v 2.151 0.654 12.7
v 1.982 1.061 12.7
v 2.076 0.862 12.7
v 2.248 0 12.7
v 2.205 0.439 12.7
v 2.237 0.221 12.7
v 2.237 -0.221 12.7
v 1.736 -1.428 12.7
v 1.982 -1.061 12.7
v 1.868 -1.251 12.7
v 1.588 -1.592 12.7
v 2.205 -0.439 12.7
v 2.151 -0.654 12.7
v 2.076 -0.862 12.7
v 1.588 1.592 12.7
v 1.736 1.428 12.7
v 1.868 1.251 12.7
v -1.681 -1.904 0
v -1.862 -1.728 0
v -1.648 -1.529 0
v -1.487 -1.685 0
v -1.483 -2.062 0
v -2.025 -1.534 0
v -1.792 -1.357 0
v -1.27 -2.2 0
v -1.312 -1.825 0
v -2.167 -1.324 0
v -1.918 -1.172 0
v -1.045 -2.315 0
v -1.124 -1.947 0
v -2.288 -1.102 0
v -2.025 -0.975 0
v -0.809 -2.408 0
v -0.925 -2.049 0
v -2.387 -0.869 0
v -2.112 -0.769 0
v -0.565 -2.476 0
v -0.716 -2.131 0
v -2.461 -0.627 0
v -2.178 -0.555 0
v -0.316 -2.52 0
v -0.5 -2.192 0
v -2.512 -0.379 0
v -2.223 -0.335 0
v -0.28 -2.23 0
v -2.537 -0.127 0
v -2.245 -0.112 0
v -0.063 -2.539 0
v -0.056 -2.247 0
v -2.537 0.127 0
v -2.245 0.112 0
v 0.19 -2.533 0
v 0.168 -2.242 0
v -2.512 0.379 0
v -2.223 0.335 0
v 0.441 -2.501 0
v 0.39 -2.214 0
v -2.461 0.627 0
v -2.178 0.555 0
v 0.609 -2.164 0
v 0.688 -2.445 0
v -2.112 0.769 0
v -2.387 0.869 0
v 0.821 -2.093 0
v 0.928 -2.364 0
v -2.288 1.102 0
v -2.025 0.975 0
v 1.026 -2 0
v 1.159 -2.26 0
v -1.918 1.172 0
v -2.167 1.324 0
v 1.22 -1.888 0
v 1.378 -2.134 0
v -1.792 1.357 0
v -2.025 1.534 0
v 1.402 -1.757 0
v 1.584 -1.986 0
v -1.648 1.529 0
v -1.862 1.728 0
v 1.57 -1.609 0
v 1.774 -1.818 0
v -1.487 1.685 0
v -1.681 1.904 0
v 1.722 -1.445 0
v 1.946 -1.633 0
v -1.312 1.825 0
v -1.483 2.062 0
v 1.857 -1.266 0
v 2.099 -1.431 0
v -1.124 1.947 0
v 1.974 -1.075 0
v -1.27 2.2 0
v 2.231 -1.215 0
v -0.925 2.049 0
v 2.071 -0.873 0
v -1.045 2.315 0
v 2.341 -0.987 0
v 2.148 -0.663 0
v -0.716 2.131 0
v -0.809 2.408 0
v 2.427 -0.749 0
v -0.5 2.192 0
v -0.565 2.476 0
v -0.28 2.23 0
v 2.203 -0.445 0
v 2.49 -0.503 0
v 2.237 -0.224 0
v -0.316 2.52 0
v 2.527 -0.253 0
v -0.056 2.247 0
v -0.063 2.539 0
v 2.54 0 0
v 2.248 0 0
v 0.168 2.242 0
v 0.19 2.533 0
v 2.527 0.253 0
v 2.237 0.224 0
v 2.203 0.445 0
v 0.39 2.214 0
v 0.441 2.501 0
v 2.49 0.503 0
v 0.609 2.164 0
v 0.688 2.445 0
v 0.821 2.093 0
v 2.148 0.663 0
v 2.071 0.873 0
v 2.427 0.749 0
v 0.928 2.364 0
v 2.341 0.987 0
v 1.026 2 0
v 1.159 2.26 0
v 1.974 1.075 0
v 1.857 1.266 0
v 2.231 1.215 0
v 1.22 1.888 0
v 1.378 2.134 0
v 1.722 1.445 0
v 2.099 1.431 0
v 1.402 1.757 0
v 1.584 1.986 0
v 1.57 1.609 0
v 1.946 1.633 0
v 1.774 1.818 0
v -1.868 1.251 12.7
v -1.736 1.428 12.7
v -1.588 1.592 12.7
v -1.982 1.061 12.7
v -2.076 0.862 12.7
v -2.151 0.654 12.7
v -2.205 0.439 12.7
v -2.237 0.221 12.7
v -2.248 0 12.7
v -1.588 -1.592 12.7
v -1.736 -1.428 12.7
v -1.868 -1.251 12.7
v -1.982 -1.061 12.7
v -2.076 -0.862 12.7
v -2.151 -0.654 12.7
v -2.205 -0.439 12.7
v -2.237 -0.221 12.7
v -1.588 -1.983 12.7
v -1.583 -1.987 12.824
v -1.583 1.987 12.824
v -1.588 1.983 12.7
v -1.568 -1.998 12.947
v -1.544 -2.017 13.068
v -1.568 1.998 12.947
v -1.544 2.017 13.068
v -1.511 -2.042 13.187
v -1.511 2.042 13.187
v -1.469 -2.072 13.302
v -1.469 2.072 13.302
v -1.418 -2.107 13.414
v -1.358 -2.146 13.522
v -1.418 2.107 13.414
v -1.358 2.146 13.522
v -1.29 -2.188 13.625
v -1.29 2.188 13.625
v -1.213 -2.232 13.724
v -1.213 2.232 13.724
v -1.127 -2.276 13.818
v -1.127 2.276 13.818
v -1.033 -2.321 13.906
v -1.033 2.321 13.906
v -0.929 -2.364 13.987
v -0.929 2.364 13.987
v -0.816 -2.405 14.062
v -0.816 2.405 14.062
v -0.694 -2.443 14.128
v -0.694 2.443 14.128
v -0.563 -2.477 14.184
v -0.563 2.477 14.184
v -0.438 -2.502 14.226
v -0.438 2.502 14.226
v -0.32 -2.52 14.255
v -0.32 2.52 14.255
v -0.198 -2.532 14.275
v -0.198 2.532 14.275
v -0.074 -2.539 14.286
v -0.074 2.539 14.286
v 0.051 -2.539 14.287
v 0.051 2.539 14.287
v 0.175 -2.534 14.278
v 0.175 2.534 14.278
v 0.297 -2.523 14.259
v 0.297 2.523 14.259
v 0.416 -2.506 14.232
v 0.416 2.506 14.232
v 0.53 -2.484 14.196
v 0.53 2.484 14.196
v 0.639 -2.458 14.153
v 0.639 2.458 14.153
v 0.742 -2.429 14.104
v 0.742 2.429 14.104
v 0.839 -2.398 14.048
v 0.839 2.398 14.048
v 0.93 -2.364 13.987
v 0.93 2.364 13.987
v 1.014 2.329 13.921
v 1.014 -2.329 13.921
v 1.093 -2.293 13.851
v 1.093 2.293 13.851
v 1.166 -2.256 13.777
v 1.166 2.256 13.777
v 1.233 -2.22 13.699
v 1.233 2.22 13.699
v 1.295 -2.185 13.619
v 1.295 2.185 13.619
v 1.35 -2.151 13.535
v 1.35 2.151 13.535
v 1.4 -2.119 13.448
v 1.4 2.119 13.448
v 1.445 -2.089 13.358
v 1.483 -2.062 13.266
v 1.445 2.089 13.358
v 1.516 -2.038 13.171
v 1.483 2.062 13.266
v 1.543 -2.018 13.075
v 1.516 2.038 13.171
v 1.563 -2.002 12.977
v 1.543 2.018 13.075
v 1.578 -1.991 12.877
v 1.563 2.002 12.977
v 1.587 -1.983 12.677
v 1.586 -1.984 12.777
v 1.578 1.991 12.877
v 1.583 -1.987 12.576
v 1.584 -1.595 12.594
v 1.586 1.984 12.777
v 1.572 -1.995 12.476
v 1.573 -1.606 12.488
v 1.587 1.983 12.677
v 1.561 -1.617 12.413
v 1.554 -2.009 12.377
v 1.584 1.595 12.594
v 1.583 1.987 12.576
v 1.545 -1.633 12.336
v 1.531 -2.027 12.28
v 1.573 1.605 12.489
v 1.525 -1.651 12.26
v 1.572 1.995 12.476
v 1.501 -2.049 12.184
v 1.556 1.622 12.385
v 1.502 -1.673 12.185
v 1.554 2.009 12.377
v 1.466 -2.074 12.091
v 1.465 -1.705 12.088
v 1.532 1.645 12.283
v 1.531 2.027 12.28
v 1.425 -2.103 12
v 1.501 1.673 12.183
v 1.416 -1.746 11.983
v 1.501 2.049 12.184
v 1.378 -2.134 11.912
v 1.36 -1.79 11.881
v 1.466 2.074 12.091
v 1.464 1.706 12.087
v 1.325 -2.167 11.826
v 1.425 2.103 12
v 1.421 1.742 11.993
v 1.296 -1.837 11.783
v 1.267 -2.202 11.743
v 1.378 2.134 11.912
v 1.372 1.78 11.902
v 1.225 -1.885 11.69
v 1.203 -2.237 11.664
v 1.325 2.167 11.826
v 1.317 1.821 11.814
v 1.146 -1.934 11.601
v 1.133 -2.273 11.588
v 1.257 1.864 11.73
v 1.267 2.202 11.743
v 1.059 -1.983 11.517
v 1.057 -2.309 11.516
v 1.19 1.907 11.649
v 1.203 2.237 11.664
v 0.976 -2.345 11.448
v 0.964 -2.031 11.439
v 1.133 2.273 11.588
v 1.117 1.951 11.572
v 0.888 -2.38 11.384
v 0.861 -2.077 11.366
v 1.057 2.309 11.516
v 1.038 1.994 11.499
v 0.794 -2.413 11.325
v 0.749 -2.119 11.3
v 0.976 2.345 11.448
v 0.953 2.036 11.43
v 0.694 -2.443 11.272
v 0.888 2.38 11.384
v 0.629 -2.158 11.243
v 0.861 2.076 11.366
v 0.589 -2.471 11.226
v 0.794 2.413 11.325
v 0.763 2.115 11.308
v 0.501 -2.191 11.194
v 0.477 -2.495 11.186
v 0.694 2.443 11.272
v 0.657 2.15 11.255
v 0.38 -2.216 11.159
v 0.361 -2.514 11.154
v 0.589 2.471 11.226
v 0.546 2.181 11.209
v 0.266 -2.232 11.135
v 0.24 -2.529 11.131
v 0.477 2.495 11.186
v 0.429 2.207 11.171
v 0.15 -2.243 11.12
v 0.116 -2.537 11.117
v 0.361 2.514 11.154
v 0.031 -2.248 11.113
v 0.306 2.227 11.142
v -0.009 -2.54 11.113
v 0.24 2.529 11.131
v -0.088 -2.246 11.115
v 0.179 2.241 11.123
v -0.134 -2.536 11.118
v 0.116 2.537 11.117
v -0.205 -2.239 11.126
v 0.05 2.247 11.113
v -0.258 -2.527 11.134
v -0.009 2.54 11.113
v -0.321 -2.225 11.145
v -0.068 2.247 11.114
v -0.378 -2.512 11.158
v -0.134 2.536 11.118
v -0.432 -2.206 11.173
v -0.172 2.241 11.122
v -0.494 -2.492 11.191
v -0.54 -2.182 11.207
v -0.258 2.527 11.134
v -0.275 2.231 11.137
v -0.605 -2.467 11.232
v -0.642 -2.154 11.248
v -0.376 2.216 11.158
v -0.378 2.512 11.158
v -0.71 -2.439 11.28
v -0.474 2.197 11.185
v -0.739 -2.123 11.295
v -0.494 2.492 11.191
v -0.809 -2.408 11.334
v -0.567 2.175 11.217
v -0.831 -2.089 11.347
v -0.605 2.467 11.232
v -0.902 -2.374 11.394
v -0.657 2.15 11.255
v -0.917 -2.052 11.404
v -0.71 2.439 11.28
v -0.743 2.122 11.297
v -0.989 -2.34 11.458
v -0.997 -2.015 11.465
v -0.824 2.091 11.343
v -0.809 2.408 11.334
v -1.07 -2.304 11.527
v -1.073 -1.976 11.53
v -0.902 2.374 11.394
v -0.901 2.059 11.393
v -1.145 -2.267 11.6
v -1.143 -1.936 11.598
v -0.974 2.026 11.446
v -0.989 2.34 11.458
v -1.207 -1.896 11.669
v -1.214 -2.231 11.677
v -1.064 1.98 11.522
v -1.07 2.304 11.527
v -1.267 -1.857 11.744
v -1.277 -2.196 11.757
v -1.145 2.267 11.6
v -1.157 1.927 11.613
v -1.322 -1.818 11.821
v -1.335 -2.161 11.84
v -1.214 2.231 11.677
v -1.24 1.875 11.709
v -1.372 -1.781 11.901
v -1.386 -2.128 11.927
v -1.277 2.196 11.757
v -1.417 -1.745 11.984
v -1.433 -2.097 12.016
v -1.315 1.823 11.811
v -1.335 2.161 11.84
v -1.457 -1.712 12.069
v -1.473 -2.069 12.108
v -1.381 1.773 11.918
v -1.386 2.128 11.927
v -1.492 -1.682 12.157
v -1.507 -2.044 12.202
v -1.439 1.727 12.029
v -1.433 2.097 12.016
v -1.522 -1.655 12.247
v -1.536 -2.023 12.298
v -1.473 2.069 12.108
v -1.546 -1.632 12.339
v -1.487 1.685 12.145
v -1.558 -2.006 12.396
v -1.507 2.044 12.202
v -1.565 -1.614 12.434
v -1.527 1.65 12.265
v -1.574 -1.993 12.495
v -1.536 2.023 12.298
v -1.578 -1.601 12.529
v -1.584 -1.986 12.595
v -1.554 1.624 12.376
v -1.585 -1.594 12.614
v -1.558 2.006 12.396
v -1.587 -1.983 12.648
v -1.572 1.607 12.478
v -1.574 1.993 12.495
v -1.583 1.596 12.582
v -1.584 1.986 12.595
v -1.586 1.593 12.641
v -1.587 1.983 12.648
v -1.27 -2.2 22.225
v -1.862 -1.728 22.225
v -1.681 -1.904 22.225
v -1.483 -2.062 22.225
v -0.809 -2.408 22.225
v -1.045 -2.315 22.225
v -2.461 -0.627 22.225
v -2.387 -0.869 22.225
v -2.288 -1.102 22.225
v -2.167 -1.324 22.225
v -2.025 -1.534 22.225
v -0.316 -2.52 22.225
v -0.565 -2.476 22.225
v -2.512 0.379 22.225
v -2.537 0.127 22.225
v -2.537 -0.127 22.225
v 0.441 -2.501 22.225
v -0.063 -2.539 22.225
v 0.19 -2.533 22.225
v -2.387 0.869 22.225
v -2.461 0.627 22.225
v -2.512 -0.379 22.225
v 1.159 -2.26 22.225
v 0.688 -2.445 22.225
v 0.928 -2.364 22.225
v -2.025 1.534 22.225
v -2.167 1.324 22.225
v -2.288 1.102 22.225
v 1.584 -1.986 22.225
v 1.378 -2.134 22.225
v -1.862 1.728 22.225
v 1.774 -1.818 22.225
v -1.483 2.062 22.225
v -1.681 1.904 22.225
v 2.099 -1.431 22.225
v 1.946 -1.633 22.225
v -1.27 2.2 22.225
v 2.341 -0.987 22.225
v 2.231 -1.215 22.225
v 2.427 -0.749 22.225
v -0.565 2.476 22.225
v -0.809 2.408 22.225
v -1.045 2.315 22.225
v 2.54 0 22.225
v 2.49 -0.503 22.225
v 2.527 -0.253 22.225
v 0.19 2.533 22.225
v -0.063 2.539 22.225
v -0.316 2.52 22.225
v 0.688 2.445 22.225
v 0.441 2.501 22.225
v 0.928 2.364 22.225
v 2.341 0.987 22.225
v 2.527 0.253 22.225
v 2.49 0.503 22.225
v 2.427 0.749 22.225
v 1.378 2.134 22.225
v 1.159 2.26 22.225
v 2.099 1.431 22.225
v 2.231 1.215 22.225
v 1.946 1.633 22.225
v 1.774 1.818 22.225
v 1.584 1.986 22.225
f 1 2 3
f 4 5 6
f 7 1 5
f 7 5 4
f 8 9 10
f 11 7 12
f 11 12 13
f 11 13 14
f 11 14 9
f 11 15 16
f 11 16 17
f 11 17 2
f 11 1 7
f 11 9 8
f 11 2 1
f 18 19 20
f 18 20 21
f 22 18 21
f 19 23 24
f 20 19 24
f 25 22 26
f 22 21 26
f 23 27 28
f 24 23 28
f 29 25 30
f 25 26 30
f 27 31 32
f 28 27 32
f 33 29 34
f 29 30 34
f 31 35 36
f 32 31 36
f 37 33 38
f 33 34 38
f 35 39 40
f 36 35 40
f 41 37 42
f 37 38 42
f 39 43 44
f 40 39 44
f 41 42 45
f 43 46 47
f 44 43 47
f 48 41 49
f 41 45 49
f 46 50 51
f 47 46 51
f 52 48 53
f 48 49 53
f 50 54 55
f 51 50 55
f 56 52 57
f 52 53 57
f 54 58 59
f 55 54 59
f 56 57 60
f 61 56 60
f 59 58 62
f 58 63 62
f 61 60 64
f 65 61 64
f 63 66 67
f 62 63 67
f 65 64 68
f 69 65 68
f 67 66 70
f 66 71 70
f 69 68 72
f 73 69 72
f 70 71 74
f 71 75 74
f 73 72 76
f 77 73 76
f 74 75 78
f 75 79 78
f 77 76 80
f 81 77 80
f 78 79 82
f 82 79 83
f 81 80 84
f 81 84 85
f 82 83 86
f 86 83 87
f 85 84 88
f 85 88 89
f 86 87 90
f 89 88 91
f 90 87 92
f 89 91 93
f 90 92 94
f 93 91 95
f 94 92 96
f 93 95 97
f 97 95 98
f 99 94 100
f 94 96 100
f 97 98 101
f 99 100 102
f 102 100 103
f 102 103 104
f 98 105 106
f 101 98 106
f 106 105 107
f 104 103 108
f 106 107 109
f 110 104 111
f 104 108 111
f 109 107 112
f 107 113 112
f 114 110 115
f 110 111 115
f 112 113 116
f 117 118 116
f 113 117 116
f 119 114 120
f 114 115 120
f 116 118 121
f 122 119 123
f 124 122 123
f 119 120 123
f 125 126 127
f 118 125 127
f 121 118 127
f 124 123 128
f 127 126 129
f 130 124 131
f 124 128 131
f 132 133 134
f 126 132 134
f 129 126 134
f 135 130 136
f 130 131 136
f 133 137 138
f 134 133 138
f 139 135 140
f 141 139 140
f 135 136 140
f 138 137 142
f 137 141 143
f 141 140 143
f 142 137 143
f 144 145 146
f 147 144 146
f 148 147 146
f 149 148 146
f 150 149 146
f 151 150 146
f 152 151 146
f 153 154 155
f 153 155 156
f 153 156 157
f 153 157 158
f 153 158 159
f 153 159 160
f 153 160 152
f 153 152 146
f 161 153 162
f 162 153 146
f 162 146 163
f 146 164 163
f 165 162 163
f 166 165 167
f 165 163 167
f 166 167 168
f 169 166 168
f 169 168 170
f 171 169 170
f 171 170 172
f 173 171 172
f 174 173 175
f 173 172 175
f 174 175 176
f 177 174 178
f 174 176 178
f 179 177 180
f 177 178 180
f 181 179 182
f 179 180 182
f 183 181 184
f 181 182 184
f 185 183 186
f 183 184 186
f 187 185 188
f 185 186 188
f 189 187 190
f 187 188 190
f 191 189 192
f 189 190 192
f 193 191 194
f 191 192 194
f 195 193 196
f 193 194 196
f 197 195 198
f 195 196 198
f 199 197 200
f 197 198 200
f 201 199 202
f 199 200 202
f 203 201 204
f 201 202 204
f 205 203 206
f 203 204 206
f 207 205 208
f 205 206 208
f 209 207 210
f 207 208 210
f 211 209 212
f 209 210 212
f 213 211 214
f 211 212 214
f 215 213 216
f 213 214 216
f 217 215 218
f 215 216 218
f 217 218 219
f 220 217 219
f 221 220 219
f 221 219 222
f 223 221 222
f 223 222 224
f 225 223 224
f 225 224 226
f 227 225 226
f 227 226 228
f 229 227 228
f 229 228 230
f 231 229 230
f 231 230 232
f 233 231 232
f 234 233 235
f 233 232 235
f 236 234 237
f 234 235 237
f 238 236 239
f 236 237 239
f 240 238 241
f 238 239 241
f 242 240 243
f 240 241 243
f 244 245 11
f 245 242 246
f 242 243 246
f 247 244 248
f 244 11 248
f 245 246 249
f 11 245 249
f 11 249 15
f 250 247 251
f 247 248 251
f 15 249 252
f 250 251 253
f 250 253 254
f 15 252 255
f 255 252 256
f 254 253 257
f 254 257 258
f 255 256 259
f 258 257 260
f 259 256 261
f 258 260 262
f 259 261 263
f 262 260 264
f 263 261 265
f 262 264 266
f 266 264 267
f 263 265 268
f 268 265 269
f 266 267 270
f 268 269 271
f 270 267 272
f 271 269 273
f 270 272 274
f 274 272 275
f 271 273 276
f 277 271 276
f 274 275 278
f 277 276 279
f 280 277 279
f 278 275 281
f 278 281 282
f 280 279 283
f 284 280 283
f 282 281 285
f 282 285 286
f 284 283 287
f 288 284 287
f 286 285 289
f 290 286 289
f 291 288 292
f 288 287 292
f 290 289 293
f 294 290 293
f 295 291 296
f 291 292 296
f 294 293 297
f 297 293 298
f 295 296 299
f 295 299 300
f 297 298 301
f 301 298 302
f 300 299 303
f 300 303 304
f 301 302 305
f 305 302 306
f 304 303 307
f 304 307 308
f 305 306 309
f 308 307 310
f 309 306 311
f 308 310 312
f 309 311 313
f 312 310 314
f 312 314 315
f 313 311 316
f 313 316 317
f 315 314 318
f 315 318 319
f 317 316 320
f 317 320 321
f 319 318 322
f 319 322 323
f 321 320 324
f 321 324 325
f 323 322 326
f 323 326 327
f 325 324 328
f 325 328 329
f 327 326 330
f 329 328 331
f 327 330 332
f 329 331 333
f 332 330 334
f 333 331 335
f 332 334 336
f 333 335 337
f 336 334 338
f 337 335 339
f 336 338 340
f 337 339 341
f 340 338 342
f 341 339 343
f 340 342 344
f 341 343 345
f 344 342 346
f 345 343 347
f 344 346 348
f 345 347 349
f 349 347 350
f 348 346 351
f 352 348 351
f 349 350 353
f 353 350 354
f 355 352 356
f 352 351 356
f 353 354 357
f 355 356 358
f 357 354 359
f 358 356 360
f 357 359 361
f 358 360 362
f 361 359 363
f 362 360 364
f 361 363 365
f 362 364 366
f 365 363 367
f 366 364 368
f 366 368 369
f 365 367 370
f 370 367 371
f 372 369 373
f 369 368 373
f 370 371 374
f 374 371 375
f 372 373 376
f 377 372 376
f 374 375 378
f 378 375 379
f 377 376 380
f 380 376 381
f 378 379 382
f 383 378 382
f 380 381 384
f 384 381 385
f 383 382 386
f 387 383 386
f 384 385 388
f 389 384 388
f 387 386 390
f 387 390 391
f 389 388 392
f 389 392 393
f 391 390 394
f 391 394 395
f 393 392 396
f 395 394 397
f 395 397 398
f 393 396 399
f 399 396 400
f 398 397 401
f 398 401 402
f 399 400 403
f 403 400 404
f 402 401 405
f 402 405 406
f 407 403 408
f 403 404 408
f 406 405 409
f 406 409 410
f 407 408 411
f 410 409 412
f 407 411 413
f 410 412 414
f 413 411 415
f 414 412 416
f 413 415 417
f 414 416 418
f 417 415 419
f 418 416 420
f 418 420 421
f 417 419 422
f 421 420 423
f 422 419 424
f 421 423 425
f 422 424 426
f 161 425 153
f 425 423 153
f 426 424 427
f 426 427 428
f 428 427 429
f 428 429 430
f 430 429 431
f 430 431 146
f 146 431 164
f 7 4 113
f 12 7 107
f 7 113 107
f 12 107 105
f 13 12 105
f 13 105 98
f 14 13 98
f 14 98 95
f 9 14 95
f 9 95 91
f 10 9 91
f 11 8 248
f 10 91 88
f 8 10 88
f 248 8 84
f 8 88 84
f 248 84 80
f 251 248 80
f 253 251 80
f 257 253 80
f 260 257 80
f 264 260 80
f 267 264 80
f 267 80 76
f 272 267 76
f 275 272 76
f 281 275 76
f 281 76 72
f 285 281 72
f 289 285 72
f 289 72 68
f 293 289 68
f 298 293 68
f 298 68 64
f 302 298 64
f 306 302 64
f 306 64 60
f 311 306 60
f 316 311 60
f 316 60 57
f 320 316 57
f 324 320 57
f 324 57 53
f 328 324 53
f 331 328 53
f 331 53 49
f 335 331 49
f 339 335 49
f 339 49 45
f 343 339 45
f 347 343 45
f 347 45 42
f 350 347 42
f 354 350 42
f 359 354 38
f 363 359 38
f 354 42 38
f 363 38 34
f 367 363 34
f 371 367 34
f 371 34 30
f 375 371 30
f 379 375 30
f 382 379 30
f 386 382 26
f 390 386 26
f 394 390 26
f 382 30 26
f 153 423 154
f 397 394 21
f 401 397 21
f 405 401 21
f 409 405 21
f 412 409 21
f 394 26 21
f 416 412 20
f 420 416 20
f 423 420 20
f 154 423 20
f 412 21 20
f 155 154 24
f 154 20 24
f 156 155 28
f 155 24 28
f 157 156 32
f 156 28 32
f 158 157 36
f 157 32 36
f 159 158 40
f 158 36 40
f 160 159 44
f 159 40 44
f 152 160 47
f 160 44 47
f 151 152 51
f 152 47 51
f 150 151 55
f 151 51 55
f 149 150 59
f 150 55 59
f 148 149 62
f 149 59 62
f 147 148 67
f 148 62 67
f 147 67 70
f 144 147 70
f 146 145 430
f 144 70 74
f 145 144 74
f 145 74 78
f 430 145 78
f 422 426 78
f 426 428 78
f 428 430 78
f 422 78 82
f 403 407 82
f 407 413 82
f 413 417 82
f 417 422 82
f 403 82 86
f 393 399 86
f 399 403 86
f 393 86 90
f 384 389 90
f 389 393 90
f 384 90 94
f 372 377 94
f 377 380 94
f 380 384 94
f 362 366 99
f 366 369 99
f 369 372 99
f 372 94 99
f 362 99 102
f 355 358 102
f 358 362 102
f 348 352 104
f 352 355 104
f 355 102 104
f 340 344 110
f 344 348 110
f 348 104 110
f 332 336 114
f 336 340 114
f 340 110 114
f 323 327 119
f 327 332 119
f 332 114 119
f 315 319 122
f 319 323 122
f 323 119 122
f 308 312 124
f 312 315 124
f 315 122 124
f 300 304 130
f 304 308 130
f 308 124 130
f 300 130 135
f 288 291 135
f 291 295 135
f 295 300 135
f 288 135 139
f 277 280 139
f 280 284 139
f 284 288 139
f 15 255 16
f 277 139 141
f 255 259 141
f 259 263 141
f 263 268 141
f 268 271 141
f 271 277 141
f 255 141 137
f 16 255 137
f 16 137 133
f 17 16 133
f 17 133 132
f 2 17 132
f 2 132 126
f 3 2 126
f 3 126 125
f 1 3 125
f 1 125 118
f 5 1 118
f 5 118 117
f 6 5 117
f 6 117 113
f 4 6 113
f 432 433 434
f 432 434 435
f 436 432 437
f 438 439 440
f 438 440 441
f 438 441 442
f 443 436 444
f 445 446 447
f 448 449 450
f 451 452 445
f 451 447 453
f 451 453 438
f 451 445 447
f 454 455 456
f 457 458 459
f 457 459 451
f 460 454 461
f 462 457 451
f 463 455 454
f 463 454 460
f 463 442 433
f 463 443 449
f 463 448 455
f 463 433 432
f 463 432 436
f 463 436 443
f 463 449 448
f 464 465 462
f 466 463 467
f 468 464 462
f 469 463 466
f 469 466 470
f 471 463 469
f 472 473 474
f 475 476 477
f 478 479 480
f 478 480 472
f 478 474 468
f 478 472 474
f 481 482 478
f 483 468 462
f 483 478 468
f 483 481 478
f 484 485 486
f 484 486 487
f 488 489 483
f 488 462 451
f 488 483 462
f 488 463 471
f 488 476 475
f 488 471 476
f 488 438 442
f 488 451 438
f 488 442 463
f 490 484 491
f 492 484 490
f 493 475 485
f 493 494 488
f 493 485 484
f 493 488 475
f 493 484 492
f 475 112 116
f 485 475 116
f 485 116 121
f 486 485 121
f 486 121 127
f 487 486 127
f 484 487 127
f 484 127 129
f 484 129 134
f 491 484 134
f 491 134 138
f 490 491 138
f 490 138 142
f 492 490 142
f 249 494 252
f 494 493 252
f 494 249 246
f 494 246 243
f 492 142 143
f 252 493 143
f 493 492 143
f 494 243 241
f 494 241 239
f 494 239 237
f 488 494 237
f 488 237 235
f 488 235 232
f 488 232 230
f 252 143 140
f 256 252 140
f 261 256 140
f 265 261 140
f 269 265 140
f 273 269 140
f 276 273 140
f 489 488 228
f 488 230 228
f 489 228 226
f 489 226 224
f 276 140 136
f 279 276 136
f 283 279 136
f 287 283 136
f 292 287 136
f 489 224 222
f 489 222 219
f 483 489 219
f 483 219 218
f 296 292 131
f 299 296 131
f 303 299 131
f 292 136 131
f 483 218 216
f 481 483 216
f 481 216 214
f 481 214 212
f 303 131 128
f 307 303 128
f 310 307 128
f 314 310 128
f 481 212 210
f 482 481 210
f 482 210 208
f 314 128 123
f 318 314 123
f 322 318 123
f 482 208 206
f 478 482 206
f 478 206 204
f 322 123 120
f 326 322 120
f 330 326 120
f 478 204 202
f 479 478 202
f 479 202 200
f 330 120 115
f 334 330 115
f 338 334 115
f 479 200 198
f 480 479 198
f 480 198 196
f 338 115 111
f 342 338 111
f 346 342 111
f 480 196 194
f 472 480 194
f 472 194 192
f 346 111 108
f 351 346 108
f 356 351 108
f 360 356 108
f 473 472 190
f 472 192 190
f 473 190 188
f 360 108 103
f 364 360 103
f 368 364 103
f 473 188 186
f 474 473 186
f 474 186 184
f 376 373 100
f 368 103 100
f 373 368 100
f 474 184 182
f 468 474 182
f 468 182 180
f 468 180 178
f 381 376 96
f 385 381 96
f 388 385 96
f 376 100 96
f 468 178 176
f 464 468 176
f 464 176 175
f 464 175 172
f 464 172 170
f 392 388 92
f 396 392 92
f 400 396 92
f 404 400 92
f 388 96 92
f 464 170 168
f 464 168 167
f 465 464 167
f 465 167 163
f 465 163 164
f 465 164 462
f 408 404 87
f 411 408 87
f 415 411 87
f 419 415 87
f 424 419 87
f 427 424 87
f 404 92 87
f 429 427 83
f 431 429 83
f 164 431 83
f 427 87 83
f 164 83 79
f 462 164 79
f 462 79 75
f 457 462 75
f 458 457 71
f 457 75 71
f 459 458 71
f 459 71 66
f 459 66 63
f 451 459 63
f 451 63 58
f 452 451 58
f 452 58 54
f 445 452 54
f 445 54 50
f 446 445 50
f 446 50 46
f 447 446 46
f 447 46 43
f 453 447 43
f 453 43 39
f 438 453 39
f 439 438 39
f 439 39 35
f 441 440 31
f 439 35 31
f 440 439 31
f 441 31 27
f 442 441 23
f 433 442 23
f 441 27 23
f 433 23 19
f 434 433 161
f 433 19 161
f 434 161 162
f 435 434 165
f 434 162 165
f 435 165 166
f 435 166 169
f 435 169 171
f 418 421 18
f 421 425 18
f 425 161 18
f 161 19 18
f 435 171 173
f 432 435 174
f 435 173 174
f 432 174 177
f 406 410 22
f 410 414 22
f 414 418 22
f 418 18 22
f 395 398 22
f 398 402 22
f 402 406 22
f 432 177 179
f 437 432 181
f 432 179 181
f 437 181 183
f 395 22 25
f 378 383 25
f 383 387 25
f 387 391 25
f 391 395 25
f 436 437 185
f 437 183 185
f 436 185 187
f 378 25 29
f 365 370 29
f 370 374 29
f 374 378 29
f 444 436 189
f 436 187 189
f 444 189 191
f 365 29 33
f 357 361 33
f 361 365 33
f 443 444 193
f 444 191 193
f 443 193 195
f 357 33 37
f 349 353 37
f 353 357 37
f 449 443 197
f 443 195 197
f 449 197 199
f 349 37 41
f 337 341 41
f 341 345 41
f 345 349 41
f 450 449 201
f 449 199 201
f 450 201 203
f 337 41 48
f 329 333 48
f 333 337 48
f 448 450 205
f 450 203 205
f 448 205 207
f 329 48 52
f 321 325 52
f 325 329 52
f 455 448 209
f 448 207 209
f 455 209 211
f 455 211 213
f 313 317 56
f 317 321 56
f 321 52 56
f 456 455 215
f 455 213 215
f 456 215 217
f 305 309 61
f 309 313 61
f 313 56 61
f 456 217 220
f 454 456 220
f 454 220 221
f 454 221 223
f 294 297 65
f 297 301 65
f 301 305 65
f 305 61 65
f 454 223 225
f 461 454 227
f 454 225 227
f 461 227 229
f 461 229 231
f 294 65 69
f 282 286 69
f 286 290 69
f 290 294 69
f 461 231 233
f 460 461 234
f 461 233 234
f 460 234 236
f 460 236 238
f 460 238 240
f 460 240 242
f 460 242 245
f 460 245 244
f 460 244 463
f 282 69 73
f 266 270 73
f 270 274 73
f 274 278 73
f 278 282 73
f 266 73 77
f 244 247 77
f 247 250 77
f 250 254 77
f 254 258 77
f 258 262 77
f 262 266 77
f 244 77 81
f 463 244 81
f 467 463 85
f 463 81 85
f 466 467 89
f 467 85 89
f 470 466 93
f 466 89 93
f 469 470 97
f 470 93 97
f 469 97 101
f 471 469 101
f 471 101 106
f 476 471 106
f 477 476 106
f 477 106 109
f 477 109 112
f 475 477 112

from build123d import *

# Parameters (mm, degrees)
F0_R     = 2.54
F1_DEPTH = 22.225
F5_D     = 3.175
F6_R     = 2.2479
F7_DEPTH = 12.7


with BuildPart() as f1:
    # F0 (on Top) → F1 (new body)
    with BuildSketch(Plane.XY):
        Circle(F0_R)
    extrude(amount=F1_DEPTH)

    # F5 (through all)
    with Locations(Plane.XZ.offset(2.54)):
        with Locations((0, 12.7)):
            Hole(F5_D / 2)

    # F6 (on face) → F7 (cut)
    with BuildSketch(Plane(origin=(0, 0, 0), x_dir=(1, 0, 0), z_dir=(0, 0, -1))):
        Circle(F6_R)
    extrude(amount=-F7_DEPTH, mode=Mode.SUBTRACT)


solid = f1.part
